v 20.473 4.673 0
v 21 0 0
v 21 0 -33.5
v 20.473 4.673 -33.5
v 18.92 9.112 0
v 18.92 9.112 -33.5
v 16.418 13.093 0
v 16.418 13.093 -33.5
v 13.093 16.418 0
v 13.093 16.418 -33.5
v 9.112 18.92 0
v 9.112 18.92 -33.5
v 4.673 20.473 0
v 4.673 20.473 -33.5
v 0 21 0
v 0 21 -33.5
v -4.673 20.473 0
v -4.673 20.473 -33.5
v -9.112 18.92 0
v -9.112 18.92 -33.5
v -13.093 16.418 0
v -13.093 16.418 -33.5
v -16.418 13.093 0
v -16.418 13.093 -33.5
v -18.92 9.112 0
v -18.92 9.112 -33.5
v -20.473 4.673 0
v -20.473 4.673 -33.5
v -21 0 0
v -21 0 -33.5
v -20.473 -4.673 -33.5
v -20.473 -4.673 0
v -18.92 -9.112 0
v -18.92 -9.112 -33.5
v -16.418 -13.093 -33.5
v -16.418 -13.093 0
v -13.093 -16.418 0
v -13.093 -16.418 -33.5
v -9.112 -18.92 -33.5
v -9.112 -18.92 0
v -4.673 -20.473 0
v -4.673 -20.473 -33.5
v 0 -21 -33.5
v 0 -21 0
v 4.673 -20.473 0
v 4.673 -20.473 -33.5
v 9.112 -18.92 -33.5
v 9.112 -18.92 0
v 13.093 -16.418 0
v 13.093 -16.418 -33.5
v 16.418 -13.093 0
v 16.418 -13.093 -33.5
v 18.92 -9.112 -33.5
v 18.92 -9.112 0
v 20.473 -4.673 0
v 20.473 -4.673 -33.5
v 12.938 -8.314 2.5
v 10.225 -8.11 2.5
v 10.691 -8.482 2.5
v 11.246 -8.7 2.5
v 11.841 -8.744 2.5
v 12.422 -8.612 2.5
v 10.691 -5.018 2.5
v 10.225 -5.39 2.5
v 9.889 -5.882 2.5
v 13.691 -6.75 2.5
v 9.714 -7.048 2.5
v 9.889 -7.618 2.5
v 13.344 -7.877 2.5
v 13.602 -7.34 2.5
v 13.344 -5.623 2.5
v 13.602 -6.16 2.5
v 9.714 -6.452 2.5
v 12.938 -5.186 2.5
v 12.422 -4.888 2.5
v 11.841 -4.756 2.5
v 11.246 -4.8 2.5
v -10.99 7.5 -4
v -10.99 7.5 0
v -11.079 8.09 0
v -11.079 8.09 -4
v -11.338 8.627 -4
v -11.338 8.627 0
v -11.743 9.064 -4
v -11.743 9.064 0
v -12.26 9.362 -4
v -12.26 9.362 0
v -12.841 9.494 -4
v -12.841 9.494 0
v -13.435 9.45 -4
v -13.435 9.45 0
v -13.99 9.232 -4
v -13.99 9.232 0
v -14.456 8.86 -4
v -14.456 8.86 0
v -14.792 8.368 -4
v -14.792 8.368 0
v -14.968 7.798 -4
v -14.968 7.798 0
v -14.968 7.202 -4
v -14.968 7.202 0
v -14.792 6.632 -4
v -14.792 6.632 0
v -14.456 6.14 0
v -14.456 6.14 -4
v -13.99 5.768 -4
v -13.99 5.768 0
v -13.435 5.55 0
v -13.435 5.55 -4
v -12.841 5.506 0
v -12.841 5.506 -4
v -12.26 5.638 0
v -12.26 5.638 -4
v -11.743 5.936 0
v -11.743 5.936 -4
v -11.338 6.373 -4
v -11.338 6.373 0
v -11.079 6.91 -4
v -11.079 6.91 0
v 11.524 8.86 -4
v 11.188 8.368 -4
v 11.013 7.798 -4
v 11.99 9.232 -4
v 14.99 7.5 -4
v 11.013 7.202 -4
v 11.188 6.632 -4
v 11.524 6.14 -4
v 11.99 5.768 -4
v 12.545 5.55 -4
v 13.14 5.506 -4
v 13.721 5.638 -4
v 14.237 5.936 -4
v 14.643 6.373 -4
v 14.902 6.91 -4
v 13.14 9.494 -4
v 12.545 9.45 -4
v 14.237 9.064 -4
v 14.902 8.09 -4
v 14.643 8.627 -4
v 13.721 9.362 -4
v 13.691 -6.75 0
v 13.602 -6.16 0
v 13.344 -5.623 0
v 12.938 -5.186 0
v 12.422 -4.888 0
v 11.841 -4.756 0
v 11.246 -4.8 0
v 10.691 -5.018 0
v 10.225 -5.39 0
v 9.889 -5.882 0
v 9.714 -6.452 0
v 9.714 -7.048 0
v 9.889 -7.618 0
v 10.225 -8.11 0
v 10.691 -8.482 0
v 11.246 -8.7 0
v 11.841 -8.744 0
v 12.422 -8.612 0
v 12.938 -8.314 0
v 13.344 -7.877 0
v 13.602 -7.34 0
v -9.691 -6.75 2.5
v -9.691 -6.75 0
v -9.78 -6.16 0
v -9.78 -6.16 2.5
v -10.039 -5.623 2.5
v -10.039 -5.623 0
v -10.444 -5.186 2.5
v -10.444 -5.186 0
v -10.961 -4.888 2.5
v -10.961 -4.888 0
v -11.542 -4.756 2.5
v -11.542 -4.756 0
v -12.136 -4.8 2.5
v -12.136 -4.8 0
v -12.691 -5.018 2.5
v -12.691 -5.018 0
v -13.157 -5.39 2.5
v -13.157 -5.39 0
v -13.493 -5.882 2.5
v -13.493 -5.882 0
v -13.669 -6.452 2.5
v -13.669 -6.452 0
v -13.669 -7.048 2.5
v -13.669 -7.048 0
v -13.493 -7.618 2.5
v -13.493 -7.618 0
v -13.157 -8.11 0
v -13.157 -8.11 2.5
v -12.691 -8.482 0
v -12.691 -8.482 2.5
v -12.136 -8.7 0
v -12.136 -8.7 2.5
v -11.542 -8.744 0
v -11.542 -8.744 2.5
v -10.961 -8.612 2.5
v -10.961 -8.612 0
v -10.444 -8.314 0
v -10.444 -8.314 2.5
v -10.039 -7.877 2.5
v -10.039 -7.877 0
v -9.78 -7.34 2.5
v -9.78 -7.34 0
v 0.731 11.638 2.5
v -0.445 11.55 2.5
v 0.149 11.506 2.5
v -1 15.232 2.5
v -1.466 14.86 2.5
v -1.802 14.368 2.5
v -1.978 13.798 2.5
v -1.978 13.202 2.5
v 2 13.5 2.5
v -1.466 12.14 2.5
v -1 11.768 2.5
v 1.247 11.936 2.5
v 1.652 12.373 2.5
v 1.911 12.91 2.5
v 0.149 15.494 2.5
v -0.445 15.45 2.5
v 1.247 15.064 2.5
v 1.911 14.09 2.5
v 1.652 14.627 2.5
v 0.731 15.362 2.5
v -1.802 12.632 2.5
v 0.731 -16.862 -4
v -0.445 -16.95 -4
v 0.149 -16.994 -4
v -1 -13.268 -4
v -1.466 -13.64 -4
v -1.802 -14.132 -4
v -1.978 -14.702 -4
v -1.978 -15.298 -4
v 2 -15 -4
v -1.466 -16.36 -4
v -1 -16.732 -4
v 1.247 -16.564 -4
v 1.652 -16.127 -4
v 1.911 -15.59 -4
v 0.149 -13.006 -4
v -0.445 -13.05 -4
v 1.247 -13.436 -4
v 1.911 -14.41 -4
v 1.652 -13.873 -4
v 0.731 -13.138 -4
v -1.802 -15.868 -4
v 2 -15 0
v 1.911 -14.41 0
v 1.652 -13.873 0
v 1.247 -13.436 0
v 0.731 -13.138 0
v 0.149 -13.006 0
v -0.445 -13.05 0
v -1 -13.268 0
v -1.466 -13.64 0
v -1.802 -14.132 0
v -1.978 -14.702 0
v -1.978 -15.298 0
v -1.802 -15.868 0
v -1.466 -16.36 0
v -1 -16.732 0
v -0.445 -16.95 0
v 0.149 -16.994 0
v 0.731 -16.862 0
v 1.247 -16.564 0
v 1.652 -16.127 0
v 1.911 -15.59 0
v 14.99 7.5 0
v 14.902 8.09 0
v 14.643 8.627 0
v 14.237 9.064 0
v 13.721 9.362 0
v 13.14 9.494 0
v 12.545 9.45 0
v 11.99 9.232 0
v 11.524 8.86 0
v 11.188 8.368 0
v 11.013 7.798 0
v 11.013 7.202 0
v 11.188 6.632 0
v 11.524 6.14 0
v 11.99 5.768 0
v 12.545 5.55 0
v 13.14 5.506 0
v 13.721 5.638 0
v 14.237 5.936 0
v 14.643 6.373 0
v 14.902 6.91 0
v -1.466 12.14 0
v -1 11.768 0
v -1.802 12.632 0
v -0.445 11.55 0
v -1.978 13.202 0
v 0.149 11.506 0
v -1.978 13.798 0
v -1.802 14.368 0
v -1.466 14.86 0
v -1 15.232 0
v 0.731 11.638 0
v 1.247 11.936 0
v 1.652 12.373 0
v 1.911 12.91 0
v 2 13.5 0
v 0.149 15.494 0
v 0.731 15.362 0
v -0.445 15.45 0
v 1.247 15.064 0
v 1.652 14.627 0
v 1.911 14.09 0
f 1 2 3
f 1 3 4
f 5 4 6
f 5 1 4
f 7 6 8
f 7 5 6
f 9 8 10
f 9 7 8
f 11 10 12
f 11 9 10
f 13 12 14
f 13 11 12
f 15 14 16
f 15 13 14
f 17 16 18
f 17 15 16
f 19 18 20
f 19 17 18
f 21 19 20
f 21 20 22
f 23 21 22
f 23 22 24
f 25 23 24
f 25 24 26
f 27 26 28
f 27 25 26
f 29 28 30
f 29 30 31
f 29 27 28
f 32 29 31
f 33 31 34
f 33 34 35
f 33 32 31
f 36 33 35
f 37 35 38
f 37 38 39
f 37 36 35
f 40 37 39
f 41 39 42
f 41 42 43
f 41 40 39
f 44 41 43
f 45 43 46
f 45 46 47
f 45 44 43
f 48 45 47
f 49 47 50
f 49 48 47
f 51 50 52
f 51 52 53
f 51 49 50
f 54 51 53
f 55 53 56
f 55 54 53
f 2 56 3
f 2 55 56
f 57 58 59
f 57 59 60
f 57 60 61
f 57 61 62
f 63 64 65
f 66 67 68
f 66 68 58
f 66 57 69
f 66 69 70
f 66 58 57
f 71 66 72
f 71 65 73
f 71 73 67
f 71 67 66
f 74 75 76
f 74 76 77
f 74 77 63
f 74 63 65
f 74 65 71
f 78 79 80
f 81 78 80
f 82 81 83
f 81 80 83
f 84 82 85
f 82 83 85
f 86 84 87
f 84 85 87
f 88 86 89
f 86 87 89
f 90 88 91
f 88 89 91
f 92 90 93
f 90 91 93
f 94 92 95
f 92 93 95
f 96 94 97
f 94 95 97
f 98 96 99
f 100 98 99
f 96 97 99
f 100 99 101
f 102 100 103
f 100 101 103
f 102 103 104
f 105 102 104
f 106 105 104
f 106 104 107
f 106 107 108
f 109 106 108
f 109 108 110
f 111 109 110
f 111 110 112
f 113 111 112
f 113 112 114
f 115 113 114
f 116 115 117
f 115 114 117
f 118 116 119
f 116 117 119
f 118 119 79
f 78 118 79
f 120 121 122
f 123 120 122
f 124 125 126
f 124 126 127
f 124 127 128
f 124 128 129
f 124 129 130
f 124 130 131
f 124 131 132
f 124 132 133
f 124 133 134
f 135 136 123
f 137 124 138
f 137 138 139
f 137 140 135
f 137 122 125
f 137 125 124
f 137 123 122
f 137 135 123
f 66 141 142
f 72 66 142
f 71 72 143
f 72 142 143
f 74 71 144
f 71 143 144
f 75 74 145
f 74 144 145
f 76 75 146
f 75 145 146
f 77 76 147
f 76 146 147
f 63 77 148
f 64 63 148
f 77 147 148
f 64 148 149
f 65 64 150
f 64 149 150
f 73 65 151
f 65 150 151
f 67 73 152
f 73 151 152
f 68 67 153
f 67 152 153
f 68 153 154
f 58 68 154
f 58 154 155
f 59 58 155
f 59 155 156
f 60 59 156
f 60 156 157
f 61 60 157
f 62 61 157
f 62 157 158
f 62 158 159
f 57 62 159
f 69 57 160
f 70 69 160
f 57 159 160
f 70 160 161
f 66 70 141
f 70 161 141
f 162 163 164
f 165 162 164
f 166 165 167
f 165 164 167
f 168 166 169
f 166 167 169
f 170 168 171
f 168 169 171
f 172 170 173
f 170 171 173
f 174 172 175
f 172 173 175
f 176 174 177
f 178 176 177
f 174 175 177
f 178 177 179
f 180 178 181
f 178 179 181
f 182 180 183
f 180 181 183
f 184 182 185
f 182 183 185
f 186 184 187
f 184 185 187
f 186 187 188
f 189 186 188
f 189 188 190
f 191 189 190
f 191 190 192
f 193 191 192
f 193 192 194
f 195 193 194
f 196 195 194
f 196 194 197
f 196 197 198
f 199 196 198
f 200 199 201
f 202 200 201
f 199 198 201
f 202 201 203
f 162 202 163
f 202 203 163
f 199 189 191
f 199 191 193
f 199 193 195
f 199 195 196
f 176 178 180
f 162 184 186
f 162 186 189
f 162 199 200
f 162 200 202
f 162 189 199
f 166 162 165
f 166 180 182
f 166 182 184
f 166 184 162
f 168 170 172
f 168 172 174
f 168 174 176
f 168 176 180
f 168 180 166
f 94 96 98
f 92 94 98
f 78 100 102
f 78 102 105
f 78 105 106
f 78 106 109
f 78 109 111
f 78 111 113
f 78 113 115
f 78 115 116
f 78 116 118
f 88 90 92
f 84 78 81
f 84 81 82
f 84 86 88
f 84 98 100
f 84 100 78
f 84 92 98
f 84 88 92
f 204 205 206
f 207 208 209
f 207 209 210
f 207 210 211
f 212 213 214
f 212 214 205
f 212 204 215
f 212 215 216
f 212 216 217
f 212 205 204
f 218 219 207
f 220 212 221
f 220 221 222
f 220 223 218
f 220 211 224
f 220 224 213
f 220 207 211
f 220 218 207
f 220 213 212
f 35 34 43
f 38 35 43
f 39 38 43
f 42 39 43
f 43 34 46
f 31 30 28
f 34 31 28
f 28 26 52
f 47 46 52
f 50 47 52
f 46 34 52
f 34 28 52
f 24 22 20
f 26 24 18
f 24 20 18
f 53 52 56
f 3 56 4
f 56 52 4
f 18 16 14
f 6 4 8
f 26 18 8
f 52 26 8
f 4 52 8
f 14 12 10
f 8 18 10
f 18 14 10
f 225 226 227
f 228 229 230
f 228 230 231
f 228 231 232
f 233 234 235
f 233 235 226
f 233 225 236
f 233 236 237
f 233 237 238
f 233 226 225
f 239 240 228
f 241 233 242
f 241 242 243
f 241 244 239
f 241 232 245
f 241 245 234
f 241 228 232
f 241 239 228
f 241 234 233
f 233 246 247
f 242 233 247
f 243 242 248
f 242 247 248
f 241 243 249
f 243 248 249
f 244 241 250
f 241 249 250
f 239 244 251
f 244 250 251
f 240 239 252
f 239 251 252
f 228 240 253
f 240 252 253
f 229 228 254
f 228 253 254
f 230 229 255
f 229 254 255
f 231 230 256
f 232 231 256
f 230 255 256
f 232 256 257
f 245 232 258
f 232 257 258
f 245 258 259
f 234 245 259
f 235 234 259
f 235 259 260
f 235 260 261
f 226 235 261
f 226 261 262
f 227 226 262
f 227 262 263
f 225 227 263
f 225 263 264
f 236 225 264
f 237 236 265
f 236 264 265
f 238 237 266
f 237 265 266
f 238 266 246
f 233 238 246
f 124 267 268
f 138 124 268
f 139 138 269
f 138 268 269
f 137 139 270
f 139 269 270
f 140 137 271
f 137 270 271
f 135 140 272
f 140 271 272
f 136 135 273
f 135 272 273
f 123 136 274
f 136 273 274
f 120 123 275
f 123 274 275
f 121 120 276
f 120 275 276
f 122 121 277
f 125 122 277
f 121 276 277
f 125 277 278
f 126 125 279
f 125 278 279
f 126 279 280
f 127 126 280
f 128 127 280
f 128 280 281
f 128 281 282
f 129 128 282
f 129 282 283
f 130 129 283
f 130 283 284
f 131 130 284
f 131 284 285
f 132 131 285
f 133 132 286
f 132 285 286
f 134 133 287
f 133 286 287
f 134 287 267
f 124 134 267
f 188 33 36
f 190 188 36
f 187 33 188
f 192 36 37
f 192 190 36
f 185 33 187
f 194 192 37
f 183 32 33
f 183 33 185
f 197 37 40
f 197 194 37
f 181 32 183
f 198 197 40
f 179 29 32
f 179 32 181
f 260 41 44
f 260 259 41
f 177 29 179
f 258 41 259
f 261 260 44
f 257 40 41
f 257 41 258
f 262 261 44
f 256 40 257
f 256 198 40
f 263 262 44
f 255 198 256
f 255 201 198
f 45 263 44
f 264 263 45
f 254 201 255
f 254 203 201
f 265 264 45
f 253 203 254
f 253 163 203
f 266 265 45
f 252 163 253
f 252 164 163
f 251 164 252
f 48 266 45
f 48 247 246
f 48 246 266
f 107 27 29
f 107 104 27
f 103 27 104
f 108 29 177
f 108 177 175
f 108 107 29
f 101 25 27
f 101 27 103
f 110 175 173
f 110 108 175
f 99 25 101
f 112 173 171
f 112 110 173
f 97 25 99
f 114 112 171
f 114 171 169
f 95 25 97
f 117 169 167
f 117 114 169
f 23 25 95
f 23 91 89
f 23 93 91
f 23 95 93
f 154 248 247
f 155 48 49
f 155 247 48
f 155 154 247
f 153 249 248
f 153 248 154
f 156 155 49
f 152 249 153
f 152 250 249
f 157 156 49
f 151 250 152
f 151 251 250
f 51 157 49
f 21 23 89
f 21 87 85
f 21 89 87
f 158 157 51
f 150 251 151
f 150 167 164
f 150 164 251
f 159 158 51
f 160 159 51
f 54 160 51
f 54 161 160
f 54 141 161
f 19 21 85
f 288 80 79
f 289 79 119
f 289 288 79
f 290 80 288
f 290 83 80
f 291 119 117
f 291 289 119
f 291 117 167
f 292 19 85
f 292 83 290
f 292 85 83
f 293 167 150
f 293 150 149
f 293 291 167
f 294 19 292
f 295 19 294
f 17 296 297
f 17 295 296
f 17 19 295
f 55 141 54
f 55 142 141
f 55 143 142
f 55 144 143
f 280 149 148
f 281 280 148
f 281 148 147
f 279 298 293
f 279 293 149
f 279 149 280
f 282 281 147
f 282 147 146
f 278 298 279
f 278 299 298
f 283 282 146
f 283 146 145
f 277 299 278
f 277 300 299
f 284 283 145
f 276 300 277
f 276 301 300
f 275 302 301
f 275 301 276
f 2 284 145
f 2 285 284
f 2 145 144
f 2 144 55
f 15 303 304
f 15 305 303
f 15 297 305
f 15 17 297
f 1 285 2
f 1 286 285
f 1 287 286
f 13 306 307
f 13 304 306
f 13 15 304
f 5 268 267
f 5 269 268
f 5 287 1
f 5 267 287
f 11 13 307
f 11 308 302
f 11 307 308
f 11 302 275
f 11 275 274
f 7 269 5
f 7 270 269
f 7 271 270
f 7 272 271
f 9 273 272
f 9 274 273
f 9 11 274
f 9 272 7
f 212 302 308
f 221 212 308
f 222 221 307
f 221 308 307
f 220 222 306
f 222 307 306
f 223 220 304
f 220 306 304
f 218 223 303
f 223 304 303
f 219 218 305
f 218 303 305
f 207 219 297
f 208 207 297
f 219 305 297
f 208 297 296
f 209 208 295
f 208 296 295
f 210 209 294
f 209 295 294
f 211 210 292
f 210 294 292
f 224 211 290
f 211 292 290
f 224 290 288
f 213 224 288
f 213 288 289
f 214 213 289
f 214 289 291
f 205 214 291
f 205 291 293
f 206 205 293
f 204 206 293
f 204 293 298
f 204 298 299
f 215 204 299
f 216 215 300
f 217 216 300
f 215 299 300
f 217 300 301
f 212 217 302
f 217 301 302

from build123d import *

# Parameters (mm, degrees)
SKETCH2_R           = 21
BOSS_EXTRUDE1_DEPTH = 33.5
SKETCH3_R           = 2
CUT_EXTRUDE2_DEPTH  = 4
SKETCH4_R           = 2
BOSS_EXTRUDE2_DEPTH = 2.5


with BuildPart() as part:
    # Sketch2 → Boss-Extrude1 (new body)
    with BuildSketch(Plane.XY):
        Circle(SKETCH2_R)
    extrude(amount=-BOSS_EXTRUDE1_DEPTH)

    # Sketch3 → Cut-Extrude2 (cut)
    with BuildSketch(Plane.XY):
        with Locations((0, -15)):
            Circle(SKETCH3_R)
        with Locations((-12.990381057, 7.5)):
            Circle(SKETCH3_R)
        with Locations((12.990381057, 7.5)):
            Circle(SKETCH3_R)
    extrude(amount=-CUT_EXTRUDE2_DEPTH, mode=Mode.SUBTRACT)

    # Sketch4 → Boss-Extrude2 (add)
    with BuildSketch(Plane.XY):
        with Locations((0, 13.5)):
            Circle(SKETCH4_R)
        with Locations((11.691342951, -6.75)):
            Circle(SKETCH4_R)
        with Locations((-11.691342951, -6.75)):
            Circle(SKETCH4_R)
    extrude(amount=BOSS_EXTRUDE2_DEPTH)


solid = part.part
